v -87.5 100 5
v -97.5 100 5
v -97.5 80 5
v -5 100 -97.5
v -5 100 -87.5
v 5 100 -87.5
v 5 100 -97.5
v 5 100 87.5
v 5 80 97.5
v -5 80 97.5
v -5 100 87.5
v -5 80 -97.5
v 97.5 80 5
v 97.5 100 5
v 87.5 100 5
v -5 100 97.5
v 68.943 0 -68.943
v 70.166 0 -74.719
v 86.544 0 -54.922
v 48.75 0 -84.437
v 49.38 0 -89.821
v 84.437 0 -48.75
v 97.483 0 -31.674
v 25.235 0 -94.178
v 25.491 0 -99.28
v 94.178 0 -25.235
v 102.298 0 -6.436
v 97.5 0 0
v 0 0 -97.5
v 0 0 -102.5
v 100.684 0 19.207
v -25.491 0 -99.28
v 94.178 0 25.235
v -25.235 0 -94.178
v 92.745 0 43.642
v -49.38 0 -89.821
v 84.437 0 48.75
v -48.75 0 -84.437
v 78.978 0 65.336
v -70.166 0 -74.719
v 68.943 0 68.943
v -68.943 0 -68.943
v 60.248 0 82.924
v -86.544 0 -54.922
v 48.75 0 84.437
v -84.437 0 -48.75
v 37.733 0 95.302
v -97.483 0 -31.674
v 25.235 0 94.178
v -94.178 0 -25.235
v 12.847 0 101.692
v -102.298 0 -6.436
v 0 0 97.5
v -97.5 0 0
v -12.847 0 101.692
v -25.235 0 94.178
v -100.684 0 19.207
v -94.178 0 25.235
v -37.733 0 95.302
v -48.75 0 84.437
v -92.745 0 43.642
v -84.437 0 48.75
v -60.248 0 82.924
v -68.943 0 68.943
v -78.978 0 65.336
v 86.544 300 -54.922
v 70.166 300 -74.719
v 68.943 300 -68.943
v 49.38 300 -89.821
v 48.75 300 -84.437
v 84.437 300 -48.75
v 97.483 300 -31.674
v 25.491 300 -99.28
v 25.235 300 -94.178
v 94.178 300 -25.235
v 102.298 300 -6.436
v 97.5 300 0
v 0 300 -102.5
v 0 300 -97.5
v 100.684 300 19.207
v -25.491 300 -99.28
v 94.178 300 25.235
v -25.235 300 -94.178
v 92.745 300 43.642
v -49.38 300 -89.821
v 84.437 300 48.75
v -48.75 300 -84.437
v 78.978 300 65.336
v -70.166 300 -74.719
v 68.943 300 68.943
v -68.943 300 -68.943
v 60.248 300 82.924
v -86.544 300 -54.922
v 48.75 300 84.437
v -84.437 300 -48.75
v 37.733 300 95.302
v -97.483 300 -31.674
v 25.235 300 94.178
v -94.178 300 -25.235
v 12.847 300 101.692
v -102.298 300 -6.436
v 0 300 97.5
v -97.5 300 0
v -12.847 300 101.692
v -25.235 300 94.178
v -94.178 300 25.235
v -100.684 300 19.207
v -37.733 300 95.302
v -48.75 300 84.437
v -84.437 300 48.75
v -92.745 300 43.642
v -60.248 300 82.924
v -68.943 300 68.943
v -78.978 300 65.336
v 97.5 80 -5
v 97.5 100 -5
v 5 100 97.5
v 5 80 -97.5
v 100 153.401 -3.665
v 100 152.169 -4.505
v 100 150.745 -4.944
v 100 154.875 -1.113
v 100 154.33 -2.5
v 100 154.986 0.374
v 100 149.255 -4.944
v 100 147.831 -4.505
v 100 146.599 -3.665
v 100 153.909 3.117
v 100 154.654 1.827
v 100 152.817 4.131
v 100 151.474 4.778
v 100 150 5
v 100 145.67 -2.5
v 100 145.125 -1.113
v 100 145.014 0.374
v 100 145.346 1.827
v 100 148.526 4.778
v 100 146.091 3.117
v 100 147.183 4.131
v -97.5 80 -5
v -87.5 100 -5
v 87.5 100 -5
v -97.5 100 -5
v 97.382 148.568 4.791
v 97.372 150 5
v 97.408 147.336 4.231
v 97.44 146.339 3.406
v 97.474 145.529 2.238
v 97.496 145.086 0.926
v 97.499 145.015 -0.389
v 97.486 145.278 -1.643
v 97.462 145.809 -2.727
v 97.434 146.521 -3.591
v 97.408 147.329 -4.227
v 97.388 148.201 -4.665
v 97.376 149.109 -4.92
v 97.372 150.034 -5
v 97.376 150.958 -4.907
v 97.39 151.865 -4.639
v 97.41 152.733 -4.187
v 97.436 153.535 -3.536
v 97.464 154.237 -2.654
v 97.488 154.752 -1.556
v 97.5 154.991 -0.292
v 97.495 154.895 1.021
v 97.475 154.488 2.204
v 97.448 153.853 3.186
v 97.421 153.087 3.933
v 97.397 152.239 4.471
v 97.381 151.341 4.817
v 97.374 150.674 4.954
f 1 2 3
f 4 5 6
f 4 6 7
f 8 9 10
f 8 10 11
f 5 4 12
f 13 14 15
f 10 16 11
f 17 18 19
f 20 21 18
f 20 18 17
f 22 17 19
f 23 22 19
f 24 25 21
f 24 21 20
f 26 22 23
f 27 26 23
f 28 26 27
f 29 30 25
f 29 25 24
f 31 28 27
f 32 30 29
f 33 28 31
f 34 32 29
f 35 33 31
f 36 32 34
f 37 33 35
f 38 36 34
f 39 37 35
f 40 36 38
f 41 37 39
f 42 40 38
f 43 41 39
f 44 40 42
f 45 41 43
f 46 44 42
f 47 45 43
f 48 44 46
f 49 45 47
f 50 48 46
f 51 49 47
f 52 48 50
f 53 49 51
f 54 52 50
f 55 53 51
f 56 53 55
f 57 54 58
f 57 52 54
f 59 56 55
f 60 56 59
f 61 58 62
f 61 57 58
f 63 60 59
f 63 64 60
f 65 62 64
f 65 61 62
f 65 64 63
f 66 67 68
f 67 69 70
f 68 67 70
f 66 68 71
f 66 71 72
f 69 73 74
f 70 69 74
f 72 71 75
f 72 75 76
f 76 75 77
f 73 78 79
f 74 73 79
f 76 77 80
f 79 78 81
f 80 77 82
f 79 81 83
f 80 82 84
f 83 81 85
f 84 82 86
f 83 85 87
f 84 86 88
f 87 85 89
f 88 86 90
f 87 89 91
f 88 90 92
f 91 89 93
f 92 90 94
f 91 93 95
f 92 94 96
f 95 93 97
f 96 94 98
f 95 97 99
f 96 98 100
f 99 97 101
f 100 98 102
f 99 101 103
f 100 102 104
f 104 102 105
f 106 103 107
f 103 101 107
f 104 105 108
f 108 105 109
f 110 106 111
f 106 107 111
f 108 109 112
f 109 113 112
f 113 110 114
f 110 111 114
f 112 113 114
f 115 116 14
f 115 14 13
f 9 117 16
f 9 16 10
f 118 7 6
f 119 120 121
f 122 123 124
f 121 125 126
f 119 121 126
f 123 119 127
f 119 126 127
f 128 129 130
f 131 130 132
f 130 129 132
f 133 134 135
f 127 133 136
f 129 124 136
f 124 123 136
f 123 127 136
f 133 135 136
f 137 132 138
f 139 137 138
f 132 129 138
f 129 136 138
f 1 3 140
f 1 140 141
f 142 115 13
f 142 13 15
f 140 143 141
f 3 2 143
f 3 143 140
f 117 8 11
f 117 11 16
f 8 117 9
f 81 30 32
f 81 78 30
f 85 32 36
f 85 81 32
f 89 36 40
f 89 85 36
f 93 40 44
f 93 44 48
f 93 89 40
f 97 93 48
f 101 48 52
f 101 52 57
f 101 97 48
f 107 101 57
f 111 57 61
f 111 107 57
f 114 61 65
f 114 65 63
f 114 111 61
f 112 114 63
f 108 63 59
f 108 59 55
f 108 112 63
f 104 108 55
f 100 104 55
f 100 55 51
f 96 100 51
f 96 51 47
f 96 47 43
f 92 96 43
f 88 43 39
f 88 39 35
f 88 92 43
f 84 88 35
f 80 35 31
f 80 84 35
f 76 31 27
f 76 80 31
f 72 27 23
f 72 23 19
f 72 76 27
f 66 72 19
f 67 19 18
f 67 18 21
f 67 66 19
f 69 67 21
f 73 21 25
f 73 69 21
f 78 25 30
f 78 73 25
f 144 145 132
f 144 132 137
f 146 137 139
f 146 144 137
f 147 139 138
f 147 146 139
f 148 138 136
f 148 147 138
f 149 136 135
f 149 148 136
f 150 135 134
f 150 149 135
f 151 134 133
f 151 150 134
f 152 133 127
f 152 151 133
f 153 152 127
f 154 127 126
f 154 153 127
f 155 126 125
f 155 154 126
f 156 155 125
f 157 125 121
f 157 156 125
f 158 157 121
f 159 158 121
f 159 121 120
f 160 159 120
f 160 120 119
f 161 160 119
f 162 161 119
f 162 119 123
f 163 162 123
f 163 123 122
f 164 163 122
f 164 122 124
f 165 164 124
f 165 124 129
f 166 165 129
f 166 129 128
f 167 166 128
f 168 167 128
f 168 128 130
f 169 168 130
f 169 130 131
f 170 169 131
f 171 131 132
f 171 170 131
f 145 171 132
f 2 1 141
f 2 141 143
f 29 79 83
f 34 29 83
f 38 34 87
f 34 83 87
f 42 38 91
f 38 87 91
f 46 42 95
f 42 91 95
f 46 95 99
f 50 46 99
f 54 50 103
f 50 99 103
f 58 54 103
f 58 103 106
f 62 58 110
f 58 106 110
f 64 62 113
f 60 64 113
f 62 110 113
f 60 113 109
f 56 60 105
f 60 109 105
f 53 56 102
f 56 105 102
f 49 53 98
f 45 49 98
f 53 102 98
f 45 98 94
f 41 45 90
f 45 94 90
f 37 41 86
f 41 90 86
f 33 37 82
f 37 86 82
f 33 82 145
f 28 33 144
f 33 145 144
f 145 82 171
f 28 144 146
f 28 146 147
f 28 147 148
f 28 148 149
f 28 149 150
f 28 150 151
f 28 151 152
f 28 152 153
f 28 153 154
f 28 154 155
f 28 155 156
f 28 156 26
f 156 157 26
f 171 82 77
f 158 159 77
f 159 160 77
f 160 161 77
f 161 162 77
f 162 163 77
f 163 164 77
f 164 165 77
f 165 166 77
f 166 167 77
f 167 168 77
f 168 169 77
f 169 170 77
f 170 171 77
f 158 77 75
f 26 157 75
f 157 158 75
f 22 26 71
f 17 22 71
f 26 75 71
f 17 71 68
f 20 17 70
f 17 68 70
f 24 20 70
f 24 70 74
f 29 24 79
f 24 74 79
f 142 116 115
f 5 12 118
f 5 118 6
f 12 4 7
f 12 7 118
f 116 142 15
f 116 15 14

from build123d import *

# Parameters (mm, degrees)
SKETCH1_W                = 5
SKETCH1_H                = 300
BOSS_EXTRUDE1_DEPTH      = 5
BOSS_EXTRUDE1_DEPTH_BACK = 5
CIRPATTERN1_COUNT        = 4
SKETCH4_R                = 5
CUT_EXTRUDE1_DEPTH       = 100


with BuildPart() as part:
    # Sketch1 → Revolve-Thin1 (revolve)
    with BuildSketch(Plane(origin=(0, 0, 0), x_dir=(0, 0, -1), z_dir=(1, 0, 0))):
        with Locations((100, 150)):
            Rectangle(SKETCH1_W, SKETCH1_H)
    revolve(axis=Axis((0, 0, 0), (0, 1, 0)))

    # Sketch4 → Cut-Extrude1 (cut)
    with BuildSketch(Plane(origin=(0, 0, 0), x_dir=(0, 0, -1), z_dir=(1, 0, 0))):
        with Locations(Location((0, 150, 0), (0, 0, 180))):
            Circle(SKETCH4_R)
    extrude(amount=CUT_EXTRUDE1_DEPTH, mode=Mode.SUBTRACT)


with BuildPart() as body_2:
    # Sketch3 → Boss-Extrude1 (new, two sides: drawn at the far end of the back side and taken through both)
    with BuildSketch(Plane(origin=(0, 0, 0), x_dir=(0, 0, -1), z_dir=(1, 0, 0)).offset(-BOSS_EXTRUDE1_DEPTH_BACK)):
        Polygon((97.5, 100), (97.5, 80), (87.5, 100), align=None)
    extrude(amount=BOSS_EXTRUDE1_DEPTH + BOSS_EXTRUDE1_DEPTH_BACK)


with BuildPart() as cirpattern1_1:
    # CirPattern1: pattern copy
    add(body_2.part.rotate(Axis((0, 0, 0), (0, 1, 0)), 1 * 360 / CIRPATTERN1_COUNT))


with BuildPart() as cirpattern1_2:
    # CirPattern1: pattern copy
    add(body_2.part.rotate(Axis((0, 0, 0), (0, 1, 0)), 2 * 360 / CIRPATTERN1_COUNT))


with BuildPart() as cirpattern1_3:
    # CirPattern1: pattern copy
    add(body_2.part.rotate(Axis((0, 0, 0), (0, 1, 0)), 3 * 360 / CIRPATTERN1_COUNT))


solid = Compound([part.part, body_2.part, cirpattern1_1.part, cirpattern1_2.part, cirpattern1_3.part])
